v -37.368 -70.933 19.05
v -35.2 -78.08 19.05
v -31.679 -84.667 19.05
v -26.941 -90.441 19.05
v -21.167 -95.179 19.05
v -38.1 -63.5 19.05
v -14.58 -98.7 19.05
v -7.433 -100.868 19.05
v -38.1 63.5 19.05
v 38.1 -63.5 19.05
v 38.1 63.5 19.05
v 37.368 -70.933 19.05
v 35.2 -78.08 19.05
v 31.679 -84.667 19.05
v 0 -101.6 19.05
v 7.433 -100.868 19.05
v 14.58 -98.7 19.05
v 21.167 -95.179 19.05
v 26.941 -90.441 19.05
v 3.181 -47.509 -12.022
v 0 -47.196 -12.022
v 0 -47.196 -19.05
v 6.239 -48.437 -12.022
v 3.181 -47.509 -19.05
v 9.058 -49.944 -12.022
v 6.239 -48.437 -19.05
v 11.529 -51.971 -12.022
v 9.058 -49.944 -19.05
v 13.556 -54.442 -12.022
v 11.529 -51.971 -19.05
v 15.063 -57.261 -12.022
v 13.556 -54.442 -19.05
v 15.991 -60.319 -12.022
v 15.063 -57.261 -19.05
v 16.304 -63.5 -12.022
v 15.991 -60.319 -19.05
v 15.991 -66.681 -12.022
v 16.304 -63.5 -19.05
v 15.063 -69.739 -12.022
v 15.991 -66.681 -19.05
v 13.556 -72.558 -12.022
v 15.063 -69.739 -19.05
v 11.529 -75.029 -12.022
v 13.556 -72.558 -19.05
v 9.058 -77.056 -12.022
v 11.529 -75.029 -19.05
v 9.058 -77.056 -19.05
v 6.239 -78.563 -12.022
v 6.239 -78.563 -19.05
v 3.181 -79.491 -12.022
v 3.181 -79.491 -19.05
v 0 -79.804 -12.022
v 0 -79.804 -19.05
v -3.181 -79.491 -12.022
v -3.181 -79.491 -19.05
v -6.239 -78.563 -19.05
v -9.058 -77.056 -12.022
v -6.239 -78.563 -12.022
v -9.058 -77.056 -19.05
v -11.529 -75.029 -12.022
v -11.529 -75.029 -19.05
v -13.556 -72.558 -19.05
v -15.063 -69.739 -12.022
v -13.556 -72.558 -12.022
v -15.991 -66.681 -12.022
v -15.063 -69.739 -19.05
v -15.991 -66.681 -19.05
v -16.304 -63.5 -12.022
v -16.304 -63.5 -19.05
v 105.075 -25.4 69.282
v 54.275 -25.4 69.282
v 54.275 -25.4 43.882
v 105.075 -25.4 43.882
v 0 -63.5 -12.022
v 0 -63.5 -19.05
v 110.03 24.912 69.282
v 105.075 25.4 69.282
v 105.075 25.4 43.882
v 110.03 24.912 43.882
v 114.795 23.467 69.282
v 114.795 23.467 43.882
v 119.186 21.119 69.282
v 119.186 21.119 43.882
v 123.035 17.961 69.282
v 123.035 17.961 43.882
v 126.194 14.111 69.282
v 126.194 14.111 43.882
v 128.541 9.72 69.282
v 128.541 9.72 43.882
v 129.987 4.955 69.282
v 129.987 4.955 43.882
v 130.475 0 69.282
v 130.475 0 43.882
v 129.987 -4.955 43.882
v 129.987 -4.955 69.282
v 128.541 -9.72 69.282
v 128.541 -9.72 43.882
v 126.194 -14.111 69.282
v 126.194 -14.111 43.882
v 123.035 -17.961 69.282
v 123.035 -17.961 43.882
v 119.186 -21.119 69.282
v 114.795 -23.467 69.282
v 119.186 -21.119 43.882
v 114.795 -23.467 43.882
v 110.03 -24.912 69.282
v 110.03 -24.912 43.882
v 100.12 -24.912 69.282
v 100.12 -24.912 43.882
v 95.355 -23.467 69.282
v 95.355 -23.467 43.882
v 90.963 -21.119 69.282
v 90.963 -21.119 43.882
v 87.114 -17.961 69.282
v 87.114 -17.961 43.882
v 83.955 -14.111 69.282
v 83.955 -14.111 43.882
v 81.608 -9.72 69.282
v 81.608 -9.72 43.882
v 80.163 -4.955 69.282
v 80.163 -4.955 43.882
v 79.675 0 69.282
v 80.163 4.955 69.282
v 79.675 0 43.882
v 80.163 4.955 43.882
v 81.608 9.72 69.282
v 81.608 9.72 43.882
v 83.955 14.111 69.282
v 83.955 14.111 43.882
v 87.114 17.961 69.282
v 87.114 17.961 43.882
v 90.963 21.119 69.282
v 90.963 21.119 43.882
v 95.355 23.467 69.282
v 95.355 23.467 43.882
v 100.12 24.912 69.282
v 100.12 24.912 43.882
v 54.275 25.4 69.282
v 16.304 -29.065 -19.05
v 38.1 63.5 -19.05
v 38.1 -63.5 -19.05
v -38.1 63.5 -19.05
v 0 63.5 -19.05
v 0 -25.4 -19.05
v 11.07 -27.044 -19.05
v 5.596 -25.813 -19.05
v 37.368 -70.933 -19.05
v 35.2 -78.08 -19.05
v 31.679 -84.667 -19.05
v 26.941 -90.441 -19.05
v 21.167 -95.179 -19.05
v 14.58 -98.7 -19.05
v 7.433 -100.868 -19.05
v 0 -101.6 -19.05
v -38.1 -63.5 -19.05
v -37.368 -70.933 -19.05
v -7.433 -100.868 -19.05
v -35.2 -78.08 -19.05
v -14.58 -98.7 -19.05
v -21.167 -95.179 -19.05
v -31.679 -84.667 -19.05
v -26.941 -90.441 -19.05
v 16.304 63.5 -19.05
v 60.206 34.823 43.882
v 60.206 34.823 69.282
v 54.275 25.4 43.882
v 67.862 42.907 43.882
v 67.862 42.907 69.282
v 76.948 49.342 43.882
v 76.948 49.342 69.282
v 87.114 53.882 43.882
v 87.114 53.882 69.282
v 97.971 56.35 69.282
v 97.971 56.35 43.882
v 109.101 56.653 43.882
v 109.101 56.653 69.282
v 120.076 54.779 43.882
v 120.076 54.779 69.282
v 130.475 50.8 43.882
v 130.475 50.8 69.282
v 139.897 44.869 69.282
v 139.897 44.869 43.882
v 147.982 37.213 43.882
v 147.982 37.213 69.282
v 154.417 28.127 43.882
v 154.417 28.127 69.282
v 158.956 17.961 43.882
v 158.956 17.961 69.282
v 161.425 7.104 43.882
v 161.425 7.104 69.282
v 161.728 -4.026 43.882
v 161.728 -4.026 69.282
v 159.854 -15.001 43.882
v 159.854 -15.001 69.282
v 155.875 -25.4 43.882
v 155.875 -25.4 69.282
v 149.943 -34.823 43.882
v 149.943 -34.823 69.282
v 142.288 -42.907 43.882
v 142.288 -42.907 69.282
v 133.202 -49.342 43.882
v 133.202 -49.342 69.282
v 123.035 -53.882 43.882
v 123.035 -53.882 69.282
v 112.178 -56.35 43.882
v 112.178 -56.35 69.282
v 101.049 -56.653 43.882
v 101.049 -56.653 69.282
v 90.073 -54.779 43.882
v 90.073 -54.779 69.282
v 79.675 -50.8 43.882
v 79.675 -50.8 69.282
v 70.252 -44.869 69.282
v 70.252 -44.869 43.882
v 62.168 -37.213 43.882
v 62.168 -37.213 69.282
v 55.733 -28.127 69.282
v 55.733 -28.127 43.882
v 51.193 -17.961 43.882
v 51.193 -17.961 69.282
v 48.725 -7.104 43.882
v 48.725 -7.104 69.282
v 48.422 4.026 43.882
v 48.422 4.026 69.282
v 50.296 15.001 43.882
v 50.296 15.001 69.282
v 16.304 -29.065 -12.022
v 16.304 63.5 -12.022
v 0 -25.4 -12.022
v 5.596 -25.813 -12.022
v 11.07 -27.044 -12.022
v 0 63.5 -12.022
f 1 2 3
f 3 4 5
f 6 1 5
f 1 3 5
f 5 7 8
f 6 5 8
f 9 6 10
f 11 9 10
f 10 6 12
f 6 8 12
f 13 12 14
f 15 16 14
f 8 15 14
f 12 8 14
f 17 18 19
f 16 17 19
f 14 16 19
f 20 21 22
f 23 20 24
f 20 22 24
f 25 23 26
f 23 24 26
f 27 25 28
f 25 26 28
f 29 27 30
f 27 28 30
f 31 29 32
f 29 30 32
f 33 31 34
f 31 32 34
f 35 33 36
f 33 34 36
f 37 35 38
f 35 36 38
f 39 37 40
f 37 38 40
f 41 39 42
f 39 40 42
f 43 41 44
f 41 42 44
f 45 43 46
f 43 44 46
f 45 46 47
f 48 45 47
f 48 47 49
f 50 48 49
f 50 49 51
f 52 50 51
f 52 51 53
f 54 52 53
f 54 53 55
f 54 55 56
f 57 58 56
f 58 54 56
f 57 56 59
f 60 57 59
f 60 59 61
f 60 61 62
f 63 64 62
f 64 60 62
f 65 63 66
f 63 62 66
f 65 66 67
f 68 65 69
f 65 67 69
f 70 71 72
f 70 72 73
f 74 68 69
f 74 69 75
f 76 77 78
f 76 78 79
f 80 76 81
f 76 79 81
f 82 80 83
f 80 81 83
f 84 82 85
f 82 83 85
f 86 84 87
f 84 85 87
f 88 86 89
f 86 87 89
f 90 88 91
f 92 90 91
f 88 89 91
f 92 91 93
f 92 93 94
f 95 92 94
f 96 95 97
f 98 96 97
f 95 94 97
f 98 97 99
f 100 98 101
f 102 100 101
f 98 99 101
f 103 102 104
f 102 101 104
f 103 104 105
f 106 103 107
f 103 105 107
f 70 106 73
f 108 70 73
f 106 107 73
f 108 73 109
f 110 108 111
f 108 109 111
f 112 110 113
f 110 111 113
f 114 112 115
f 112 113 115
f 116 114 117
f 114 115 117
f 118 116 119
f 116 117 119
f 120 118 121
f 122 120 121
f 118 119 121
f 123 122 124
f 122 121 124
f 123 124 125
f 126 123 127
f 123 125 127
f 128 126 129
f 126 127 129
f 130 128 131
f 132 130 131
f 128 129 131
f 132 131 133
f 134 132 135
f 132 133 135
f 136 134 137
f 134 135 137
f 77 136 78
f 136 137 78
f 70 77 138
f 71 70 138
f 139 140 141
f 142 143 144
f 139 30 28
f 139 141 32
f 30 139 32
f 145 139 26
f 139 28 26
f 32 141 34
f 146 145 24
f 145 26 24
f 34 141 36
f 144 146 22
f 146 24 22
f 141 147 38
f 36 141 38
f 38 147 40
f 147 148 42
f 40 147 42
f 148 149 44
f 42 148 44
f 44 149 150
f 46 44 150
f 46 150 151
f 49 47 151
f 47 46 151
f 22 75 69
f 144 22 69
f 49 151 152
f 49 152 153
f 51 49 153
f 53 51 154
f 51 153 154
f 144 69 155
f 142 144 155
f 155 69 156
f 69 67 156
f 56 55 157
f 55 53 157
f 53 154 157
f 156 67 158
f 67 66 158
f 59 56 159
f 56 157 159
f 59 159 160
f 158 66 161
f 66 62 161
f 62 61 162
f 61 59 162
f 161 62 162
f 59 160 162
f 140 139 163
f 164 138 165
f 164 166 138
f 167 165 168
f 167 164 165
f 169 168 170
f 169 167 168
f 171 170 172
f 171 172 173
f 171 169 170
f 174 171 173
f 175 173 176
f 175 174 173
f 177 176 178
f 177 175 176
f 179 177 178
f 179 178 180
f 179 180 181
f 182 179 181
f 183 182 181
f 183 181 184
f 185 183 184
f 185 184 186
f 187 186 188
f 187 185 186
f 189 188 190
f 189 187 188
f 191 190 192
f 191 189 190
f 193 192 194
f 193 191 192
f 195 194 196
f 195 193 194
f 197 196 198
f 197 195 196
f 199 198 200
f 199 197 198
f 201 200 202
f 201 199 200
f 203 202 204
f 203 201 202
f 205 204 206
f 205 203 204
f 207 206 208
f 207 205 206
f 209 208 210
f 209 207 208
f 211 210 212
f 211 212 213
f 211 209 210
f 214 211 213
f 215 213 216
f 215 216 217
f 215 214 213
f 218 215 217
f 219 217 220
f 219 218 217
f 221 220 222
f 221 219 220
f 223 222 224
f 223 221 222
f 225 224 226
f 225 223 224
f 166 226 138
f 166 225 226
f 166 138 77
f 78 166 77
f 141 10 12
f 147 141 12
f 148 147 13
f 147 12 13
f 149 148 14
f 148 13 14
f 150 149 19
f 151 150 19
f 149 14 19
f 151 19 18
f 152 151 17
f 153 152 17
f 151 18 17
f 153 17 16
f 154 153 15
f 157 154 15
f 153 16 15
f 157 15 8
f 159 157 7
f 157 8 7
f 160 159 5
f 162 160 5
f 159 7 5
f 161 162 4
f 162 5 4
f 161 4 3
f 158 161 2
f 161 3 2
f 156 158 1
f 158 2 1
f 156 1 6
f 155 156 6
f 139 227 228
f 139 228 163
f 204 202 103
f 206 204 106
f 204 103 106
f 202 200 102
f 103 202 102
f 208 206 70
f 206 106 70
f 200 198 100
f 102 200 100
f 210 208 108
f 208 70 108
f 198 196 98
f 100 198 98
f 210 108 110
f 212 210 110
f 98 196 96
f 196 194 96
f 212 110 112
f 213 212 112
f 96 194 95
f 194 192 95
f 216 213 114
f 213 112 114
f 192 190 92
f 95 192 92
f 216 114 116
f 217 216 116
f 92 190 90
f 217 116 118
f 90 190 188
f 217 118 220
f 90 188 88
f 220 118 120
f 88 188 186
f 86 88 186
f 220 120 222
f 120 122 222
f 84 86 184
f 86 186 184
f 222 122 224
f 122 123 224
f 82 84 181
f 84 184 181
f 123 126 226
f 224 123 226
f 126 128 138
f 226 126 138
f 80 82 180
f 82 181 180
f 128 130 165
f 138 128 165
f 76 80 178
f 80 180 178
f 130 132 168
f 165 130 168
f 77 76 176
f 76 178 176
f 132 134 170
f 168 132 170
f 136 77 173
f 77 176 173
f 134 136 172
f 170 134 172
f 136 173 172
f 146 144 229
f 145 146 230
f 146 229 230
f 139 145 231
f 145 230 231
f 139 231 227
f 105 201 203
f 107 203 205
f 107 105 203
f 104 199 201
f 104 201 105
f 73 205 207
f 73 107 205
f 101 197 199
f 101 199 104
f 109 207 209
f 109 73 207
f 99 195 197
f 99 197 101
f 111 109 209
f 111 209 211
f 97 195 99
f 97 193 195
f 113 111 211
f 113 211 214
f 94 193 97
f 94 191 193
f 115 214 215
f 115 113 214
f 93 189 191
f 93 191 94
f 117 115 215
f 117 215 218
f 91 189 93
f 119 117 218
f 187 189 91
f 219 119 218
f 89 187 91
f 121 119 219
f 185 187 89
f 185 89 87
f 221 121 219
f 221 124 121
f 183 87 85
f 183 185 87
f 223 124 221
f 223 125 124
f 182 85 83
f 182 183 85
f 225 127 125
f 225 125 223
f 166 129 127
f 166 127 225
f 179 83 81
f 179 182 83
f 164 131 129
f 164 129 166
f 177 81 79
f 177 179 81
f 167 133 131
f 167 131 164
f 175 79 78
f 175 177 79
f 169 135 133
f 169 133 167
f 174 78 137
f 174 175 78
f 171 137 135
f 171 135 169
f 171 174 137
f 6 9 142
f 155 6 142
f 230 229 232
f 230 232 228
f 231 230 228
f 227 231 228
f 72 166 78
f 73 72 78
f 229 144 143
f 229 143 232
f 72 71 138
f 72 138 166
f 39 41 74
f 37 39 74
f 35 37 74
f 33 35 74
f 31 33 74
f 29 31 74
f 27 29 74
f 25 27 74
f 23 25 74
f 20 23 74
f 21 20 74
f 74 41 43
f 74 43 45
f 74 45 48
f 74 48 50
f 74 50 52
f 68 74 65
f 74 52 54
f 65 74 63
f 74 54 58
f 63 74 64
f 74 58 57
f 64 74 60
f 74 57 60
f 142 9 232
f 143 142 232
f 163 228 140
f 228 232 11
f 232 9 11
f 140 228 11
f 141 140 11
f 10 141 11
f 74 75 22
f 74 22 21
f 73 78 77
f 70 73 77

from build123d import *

# Parameters (mm, degrees)
F1_DEPTH  = 63.5
F2_DEPTH  = 25.4
F3_DEPTH  = 12.7
F4_DEPTH  = 25.4
F4_FACE_W = 50.8
F4_FACE_H = 25.4
F7_DEPTH  = 127.001


with BuildPart() as f1:
    # F0 (on Front) → F1 (new body, symmetric)
    with BuildSketch(Plane.XZ):
        Polygon((-38.1, 19.05), (-38.1, -19.05), (38.1, -19.05), (38.1, 19.05), (28.702, 19.05), align=None)
    extrude(amount=F1_DEPTH, both=True)

    # F0 (on Front) → F2 (join, symmetric)
    with BuildSketch(Plane.XZ):
        with BuildLine():
            Line((28.702, 19.05), (38.1, 19.05))
            Line((38.1, 19.05), (38.1, 33.581085))
            ThreePointArc((38.1, 33.581085), (41.818768, 42.558985), (50.796668, 46.277752))
            Line((50.796668, 46.277752), (54.274827, 46.277752))
            Line((54.274827, 46.277752), (54.274827, 55.675753))
            Line((54.274827, 55.675753), (50.796668, 55.675753))
            ThreePointArc((50.796668, 55.675753), (35.173378, 49.204374), (28.702, 33.581085))
            Line((28.702, 33.581085), (28.702, 19.05))
        make_face()
    extrude(amount=F2_DEPTH, both=True)

    # F0 (on Front) → F3 (join, symmetric)
    with BuildSketch(Plane.XZ):
        with BuildLine():
            add(Edge.make_bspline(
                [(54.274827, 69.281778), (42.014824, 65.808109), (14.071827, 56.114373), (-25.040564, 50.807887), (-36.648956, 24.378304), (-38.1, 19.05)],
                knots=[0, 0, 0, 0, 39.835231, 87.963707, 110.08523, 110.08523, 110.08523, 110.08523], degree=3))
            Line((-38.1, 19.05), (28.702, 19.05))
            Line((28.702, 19.05), (28.702, 33.581085))
            ThreePointArc((28.702, 33.581085), (35.173378, 49.204374), (50.796668, 55.675753))
            Line((50.796668, 55.675753), (54.274827, 55.675753))
            Line((54.274827, 55.675753), (54.274827, 69.281778))
        make_face()
    extrude(amount=F3_DEPTH, both=True)

    # F6 (on face) → F7 (intersect, through all)
    with BuildSketch(Plane.XZ.offset(63.5)):
        Polygon((-38.1, -19.05), (0, -19.05), (0, -12.021991), (16.304189, -12.021991), (16.304189, -19.05), (38.1, -19.05), (38.1, 19.05), (-38.1, 19.05), align=None)
    extrude(amount=-F7_DEPTH, mode=Mode.INTERSECT)

    # F9 (on face) → F10 (revolve)
    with BuildSketch(Plane.XZ.offset(63.5)):
        Polygon((38.1, 19.05), (0, 19.05), (0, -12.021991), (16.304189, -12.021991), (16.304189, -19.05), (38.1, -19.05), align=None)
    revolve(axis=Axis((0, -63.5, 3.514004), (0, 0, -1)))


with BuildPart() as f4:
    # F0 (on Front) → F4 (new body, symmetric)
    with BuildSketch(Plane.XZ):
        Polygon((105.074827, 69.281778), (54.274827, 69.281778), (54.274827, 55.675753), (54.274827, 46.277752), (54.274827, 43.881778), (105.074827, 43.881778), align=None)
    extrude(amount=F4_DEPTH, both=True)


with BuildPart() as f5:
    # F4_face (on face) → F5 (revolve)
    with BuildSketch(Plane(origin=(79.674827, 25.4, 56.581778), x_dir=(1, 0, 0), z_dir=(0, 1, 0))):
        Rectangle(F4_FACE_W, F4_FACE_H)
    revolve(axis=Axis((105.074827, 0, 56.581778), (0, 0, -1)))


solid = Compound([f1.part, f4.part, f5.part])
